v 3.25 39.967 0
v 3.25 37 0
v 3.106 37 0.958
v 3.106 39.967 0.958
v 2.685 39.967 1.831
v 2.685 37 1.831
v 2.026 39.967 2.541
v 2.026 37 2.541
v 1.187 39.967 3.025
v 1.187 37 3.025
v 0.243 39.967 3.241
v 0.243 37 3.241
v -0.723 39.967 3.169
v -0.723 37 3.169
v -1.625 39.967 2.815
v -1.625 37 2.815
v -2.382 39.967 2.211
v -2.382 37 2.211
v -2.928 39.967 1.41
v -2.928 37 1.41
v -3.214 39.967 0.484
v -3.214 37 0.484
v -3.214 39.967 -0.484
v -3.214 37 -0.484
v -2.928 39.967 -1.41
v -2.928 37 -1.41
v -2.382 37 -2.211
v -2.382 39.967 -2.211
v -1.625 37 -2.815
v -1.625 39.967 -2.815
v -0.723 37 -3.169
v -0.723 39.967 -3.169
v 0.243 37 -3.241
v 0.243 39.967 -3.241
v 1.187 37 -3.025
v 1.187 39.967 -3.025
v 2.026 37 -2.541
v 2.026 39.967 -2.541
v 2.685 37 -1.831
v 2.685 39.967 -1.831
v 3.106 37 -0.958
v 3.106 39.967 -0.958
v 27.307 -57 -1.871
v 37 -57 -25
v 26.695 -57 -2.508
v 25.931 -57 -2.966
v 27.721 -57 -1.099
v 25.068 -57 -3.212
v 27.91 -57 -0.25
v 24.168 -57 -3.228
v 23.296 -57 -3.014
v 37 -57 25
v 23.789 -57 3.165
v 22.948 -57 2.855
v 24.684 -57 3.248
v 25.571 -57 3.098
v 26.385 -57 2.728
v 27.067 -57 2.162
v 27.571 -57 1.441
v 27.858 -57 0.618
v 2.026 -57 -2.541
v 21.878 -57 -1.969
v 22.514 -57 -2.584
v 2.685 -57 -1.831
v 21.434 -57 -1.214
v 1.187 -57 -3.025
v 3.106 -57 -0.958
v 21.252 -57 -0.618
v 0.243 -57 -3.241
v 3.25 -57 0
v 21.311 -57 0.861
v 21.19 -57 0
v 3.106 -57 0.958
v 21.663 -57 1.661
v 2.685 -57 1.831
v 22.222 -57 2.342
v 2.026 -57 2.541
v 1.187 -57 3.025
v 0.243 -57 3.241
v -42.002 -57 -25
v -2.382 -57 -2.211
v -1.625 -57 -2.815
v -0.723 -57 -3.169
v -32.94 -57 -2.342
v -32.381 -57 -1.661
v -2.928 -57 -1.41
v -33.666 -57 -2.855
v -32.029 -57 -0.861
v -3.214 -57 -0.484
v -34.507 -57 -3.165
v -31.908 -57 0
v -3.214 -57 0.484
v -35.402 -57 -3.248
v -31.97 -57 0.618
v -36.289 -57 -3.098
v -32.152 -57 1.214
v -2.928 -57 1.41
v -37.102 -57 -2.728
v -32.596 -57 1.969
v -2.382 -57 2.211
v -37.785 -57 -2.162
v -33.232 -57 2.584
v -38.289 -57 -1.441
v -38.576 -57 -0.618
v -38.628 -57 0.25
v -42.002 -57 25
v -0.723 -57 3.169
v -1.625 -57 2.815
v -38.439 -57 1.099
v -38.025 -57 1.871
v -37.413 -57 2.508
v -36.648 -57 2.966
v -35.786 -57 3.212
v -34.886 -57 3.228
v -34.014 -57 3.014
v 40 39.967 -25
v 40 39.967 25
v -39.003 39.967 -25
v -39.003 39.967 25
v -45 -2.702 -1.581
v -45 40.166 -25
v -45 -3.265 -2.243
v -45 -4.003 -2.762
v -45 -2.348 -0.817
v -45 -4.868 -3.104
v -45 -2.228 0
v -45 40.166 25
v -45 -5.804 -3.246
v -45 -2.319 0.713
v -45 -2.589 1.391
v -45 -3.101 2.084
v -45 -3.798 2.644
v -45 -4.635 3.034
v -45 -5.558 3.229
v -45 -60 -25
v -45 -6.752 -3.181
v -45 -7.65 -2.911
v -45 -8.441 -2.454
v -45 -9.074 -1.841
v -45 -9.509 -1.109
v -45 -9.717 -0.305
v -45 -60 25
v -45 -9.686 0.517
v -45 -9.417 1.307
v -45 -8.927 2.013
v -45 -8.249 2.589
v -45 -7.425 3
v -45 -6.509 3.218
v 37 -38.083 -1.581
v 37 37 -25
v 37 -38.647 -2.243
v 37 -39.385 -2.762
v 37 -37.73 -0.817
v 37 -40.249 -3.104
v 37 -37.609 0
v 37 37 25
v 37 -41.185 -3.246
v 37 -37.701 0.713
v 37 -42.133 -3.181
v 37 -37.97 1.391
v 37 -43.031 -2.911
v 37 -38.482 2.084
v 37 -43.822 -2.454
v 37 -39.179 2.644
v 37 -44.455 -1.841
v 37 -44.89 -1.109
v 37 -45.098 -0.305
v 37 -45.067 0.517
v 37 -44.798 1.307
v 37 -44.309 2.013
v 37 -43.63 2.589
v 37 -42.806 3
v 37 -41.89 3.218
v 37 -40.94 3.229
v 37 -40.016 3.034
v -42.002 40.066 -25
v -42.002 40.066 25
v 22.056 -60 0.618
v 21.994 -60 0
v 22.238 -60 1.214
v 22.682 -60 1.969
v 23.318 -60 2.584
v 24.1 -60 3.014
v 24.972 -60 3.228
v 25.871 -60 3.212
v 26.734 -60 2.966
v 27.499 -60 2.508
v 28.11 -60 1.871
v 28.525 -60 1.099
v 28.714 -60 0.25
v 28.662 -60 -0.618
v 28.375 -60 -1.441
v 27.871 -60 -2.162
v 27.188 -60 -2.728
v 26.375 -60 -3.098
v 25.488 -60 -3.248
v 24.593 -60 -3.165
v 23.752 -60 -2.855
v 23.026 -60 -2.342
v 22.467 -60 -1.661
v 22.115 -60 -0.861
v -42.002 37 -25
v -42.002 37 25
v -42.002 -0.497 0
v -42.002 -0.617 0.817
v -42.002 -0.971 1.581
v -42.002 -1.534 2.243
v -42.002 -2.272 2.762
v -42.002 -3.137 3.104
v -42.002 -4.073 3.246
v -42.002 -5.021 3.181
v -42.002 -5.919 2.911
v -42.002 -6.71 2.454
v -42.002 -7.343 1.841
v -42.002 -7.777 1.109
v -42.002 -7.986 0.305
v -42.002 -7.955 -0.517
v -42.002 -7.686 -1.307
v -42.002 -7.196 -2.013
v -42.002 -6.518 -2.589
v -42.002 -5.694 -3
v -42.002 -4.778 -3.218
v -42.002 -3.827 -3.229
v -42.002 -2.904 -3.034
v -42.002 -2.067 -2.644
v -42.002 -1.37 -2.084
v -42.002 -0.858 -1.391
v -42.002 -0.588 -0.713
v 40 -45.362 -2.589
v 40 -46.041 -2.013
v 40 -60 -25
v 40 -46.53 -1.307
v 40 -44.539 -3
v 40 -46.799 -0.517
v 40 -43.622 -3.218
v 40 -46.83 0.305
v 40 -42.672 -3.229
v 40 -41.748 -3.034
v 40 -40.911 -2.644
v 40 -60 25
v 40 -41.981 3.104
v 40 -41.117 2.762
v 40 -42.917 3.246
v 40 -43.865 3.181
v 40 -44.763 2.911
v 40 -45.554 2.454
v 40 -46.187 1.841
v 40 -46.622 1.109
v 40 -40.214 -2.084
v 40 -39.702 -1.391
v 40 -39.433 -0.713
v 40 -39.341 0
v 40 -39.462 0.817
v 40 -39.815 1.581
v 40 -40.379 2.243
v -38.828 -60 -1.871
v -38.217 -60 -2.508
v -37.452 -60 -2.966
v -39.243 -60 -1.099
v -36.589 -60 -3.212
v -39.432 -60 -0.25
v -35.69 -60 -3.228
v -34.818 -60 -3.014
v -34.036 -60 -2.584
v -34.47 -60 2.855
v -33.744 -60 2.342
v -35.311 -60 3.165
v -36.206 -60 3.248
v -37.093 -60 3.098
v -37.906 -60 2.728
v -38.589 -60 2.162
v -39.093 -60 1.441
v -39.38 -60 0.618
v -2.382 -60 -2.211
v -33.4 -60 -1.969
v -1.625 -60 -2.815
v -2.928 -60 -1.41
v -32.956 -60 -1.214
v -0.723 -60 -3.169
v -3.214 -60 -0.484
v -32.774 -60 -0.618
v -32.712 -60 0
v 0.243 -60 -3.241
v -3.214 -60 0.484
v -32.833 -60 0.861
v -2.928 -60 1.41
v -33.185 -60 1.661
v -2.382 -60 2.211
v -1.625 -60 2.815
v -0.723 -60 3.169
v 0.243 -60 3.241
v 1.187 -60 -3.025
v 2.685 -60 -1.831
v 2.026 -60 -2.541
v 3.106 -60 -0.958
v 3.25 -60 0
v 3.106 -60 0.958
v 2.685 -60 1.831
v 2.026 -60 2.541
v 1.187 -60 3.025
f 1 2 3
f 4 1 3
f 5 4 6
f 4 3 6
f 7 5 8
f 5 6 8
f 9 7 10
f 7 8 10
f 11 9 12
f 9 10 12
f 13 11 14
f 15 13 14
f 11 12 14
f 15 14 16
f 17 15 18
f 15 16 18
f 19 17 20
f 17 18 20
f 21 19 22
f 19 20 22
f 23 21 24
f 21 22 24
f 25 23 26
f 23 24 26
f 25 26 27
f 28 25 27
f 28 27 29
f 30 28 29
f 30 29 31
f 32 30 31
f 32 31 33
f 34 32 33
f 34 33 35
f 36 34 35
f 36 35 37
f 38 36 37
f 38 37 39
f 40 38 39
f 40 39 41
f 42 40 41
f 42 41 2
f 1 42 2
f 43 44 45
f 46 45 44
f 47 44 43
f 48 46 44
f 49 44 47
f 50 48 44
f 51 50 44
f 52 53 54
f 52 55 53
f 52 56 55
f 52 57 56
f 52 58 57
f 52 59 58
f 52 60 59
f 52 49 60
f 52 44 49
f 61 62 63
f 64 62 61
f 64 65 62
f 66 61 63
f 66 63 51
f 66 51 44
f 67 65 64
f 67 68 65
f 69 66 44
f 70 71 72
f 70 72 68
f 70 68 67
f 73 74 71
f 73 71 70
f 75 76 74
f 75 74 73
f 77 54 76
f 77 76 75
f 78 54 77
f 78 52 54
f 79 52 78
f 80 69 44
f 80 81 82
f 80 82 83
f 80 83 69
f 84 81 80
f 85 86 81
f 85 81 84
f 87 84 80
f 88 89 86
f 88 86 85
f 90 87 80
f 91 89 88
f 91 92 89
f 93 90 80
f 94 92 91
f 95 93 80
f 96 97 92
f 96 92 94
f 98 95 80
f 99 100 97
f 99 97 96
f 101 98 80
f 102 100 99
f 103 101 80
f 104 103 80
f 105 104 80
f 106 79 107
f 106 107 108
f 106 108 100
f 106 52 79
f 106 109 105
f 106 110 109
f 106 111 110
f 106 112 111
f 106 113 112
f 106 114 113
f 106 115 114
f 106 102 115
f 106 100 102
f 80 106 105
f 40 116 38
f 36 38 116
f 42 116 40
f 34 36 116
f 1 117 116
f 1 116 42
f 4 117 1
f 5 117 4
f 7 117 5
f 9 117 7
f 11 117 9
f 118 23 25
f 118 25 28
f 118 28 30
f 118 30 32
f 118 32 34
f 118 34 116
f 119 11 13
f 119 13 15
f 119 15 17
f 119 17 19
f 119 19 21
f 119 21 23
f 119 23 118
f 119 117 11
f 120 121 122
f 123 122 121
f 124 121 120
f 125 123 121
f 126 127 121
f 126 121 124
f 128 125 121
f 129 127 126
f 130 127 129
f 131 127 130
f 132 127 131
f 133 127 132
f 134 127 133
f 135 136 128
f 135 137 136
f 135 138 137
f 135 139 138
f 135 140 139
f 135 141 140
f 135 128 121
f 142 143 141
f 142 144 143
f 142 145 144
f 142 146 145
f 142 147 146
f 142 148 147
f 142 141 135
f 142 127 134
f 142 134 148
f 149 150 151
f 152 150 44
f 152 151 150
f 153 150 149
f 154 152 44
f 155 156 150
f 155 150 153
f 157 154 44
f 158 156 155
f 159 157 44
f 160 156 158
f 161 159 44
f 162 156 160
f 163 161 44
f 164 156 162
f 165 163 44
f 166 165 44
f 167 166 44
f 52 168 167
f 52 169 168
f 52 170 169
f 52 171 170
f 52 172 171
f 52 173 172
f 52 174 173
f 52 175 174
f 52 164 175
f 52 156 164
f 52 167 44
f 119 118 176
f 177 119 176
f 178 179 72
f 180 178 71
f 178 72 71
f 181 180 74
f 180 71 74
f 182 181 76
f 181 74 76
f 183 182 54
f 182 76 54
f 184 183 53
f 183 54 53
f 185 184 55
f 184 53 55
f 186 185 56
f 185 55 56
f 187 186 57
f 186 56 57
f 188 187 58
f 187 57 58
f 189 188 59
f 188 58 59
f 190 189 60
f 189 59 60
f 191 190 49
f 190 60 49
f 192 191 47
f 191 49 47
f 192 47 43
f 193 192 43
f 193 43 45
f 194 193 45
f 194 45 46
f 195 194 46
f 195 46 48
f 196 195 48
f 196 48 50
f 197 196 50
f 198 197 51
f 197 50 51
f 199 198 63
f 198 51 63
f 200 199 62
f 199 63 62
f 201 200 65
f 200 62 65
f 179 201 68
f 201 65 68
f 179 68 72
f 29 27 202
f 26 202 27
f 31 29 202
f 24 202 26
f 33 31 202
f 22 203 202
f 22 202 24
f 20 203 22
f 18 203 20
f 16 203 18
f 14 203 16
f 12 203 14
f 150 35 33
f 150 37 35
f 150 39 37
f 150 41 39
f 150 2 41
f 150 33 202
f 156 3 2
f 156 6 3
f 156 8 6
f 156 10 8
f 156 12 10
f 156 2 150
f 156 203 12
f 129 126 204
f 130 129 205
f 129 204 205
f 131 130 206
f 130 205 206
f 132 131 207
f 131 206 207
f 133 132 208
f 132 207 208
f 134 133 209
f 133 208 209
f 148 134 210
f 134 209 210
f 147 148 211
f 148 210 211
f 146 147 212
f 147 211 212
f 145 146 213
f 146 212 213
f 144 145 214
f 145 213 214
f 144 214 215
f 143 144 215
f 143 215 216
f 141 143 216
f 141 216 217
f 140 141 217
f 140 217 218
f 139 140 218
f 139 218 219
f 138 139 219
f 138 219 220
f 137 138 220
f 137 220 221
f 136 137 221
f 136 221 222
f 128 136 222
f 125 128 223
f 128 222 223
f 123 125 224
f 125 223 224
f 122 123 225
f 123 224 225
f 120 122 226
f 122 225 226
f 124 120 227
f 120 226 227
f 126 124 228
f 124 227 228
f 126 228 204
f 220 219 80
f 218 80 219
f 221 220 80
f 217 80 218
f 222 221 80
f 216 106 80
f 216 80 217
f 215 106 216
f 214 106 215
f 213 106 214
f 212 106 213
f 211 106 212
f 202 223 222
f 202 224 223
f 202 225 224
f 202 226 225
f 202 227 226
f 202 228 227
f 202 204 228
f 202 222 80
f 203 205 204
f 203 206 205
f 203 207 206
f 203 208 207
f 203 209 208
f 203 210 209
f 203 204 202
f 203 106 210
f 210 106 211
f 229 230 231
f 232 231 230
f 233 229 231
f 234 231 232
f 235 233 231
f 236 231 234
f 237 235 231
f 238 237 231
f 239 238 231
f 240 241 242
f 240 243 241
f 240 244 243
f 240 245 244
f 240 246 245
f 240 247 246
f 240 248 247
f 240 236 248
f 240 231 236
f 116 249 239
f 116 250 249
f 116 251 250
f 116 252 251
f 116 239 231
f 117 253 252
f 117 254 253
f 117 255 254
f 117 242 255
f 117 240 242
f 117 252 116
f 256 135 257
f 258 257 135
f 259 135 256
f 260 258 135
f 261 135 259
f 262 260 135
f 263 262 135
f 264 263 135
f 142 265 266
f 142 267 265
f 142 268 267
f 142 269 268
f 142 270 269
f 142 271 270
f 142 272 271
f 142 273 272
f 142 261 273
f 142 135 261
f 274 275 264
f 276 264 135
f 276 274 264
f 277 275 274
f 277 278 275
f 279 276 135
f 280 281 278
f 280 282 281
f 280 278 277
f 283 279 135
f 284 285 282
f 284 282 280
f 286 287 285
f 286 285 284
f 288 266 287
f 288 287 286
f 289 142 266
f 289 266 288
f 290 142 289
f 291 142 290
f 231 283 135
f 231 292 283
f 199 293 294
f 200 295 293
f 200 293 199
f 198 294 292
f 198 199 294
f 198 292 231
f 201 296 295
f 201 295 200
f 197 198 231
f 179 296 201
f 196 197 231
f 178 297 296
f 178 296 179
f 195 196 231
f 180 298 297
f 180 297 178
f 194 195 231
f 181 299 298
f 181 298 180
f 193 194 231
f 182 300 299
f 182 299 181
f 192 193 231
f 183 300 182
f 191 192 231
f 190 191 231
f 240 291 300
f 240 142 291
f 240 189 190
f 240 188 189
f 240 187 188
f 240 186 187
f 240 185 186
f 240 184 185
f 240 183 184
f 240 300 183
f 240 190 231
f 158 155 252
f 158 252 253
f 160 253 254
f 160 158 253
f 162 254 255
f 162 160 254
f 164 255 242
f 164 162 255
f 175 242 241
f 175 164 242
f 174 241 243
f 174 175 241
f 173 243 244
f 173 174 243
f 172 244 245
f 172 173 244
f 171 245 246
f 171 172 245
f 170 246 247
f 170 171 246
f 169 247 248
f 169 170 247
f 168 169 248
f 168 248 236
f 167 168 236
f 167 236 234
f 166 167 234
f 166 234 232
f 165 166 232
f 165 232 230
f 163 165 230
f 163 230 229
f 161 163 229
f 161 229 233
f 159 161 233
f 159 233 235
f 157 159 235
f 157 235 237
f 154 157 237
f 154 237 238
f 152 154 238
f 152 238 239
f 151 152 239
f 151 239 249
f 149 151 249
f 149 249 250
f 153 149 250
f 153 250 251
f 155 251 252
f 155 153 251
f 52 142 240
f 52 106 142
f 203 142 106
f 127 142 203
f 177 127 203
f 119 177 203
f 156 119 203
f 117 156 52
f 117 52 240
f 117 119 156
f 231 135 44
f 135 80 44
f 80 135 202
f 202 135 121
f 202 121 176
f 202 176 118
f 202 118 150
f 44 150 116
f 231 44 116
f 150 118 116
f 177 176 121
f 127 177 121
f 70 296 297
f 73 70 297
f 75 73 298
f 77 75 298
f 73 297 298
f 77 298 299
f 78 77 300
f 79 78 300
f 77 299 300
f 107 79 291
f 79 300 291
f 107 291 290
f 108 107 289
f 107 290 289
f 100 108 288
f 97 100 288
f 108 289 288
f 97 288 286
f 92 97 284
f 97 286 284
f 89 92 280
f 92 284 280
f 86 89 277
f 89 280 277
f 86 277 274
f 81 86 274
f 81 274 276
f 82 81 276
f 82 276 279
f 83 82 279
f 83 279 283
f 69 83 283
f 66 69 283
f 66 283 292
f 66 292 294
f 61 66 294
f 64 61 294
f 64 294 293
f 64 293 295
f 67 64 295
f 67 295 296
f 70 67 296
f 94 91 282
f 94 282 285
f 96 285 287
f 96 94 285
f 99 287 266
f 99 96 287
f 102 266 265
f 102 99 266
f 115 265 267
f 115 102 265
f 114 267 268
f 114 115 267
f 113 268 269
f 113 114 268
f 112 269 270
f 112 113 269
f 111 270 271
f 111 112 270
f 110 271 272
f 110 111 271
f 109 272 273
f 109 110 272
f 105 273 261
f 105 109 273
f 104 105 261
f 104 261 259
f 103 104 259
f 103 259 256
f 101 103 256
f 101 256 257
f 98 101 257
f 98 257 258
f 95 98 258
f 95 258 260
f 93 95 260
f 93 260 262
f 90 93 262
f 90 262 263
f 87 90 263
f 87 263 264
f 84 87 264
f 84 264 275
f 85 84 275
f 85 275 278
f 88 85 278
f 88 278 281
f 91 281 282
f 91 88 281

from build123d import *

# Parameters (mm, degrees)
F2_DEPTH  = 25
F3_DEPTH  = 25
F10_R     = 3.25
F11_DEPTH = 50
F12_R     = 3.25
F13_DEPTH = 50
F14_R     = 3.25
F15_DEPTH = 120
F22_R     = 3.25
F23_DEPTH = 100
F24_R     = 3.25
F25_DEPTH = 100


with BuildPart() as f2:
    # F1 (on Top) → F2 (new body)
    with BuildSketch(Plane.XY):
        Polygon((-45, -60), (-40, -60), (40, -60), (40, 39.9669196701), (-36.0033019851, 39.9669196701), (-39.0033019851, 39.9669196701), (-42.0016509926, 40.0664346415), (-45, 40.1659496129), align=None)
        Polygon((37, -57), (-37, -57), (-42.0016509926, -57), (-42.0016509926, 37), (-37, 37), (37, 37), align=None, mode=Mode.SUBTRACT)
    extrude(amount=F2_DEPTH)

    # F1 (on Top) → F3 (join)
    with BuildSketch(Plane.XY):
        Polygon((-45, -60), (-40, -60), (40, -60), (40, 39.9669196701), (-36.0033019851, 39.9669196701), (-39.0033019851, 39.9669196701), (-42.0016509926, 40.0664346415), (-45, 40.1659496129), align=None)
        Polygon((37, -57), (-37, -57), (-42.0016509926, -57), (-42.0016509926, 37), (-37, 37), (37, 37), align=None, mode=Mode.SUBTRACT)
    extrude(amount=-F3_DEPTH)

    # F10 (on face) → F11 (cut)
    with BuildSketch(Plane(origin=(8.6602540378, -32.3205080757, 0), x_dir=(-0.9659258263, -0.2588190451, 0), z_dir=(-0.2588190451, 0.9659258263, 0))):
        with Locations((-8.9657547217, 0)):
            Circle(F10_R)
    extrude(amount=-F11_DEPTH, mode=Mode.SUBTRACT)

    # F12 (on face) → F13 (cut)
    with BuildSketch(Plane(origin=(25.9807621135, -15, 0), x_dir=(0.5, 0.8660254038, 0), z_dir=(0.8660254038, -0.5, 0))):
        with Locations((-17.3205080757, 0)):
            Circle(F12_R)
    extrude(amount=F13_DEPTH, mode=Mode.SUBTRACT)

    # F14 (on face) → F15 (cut)
    with BuildSketch(Plane.XZ.offset(60)):
        Circle(F14_R)
    extrude(amount=-F15_DEPTH, mode=Mode.SUBTRACT)

    # F22 (on face) → F23 (cut)
    with BuildSketch(Plane(origin=(1.3397459622, 5, 0), x_dir=(0.9659258263, -0.2588190451, 0), z_dir=(-0.2588190451, -0.9659258263, 0))):
        with Locations((-19.3185165258, 0)):
            Circle(F22_R)
    extrude(amount=F23_DEPTH, mode=Mode.SUBTRACT)

    # F24 (on face) → F25 (cut)
    with BuildSketch(Plane(origin=(-8.6602540378, -5, 0), x_dir=(-0.5, 0.8660254038, 0), z_dir=(0.8660254038, 0.5, 0))):
        with Locations((17.3205080757, 0)):
            Circle(F24_R)
    extrude(amount=-F25_DEPTH, mode=Mode.SUBTRACT)


solid = f2.part
